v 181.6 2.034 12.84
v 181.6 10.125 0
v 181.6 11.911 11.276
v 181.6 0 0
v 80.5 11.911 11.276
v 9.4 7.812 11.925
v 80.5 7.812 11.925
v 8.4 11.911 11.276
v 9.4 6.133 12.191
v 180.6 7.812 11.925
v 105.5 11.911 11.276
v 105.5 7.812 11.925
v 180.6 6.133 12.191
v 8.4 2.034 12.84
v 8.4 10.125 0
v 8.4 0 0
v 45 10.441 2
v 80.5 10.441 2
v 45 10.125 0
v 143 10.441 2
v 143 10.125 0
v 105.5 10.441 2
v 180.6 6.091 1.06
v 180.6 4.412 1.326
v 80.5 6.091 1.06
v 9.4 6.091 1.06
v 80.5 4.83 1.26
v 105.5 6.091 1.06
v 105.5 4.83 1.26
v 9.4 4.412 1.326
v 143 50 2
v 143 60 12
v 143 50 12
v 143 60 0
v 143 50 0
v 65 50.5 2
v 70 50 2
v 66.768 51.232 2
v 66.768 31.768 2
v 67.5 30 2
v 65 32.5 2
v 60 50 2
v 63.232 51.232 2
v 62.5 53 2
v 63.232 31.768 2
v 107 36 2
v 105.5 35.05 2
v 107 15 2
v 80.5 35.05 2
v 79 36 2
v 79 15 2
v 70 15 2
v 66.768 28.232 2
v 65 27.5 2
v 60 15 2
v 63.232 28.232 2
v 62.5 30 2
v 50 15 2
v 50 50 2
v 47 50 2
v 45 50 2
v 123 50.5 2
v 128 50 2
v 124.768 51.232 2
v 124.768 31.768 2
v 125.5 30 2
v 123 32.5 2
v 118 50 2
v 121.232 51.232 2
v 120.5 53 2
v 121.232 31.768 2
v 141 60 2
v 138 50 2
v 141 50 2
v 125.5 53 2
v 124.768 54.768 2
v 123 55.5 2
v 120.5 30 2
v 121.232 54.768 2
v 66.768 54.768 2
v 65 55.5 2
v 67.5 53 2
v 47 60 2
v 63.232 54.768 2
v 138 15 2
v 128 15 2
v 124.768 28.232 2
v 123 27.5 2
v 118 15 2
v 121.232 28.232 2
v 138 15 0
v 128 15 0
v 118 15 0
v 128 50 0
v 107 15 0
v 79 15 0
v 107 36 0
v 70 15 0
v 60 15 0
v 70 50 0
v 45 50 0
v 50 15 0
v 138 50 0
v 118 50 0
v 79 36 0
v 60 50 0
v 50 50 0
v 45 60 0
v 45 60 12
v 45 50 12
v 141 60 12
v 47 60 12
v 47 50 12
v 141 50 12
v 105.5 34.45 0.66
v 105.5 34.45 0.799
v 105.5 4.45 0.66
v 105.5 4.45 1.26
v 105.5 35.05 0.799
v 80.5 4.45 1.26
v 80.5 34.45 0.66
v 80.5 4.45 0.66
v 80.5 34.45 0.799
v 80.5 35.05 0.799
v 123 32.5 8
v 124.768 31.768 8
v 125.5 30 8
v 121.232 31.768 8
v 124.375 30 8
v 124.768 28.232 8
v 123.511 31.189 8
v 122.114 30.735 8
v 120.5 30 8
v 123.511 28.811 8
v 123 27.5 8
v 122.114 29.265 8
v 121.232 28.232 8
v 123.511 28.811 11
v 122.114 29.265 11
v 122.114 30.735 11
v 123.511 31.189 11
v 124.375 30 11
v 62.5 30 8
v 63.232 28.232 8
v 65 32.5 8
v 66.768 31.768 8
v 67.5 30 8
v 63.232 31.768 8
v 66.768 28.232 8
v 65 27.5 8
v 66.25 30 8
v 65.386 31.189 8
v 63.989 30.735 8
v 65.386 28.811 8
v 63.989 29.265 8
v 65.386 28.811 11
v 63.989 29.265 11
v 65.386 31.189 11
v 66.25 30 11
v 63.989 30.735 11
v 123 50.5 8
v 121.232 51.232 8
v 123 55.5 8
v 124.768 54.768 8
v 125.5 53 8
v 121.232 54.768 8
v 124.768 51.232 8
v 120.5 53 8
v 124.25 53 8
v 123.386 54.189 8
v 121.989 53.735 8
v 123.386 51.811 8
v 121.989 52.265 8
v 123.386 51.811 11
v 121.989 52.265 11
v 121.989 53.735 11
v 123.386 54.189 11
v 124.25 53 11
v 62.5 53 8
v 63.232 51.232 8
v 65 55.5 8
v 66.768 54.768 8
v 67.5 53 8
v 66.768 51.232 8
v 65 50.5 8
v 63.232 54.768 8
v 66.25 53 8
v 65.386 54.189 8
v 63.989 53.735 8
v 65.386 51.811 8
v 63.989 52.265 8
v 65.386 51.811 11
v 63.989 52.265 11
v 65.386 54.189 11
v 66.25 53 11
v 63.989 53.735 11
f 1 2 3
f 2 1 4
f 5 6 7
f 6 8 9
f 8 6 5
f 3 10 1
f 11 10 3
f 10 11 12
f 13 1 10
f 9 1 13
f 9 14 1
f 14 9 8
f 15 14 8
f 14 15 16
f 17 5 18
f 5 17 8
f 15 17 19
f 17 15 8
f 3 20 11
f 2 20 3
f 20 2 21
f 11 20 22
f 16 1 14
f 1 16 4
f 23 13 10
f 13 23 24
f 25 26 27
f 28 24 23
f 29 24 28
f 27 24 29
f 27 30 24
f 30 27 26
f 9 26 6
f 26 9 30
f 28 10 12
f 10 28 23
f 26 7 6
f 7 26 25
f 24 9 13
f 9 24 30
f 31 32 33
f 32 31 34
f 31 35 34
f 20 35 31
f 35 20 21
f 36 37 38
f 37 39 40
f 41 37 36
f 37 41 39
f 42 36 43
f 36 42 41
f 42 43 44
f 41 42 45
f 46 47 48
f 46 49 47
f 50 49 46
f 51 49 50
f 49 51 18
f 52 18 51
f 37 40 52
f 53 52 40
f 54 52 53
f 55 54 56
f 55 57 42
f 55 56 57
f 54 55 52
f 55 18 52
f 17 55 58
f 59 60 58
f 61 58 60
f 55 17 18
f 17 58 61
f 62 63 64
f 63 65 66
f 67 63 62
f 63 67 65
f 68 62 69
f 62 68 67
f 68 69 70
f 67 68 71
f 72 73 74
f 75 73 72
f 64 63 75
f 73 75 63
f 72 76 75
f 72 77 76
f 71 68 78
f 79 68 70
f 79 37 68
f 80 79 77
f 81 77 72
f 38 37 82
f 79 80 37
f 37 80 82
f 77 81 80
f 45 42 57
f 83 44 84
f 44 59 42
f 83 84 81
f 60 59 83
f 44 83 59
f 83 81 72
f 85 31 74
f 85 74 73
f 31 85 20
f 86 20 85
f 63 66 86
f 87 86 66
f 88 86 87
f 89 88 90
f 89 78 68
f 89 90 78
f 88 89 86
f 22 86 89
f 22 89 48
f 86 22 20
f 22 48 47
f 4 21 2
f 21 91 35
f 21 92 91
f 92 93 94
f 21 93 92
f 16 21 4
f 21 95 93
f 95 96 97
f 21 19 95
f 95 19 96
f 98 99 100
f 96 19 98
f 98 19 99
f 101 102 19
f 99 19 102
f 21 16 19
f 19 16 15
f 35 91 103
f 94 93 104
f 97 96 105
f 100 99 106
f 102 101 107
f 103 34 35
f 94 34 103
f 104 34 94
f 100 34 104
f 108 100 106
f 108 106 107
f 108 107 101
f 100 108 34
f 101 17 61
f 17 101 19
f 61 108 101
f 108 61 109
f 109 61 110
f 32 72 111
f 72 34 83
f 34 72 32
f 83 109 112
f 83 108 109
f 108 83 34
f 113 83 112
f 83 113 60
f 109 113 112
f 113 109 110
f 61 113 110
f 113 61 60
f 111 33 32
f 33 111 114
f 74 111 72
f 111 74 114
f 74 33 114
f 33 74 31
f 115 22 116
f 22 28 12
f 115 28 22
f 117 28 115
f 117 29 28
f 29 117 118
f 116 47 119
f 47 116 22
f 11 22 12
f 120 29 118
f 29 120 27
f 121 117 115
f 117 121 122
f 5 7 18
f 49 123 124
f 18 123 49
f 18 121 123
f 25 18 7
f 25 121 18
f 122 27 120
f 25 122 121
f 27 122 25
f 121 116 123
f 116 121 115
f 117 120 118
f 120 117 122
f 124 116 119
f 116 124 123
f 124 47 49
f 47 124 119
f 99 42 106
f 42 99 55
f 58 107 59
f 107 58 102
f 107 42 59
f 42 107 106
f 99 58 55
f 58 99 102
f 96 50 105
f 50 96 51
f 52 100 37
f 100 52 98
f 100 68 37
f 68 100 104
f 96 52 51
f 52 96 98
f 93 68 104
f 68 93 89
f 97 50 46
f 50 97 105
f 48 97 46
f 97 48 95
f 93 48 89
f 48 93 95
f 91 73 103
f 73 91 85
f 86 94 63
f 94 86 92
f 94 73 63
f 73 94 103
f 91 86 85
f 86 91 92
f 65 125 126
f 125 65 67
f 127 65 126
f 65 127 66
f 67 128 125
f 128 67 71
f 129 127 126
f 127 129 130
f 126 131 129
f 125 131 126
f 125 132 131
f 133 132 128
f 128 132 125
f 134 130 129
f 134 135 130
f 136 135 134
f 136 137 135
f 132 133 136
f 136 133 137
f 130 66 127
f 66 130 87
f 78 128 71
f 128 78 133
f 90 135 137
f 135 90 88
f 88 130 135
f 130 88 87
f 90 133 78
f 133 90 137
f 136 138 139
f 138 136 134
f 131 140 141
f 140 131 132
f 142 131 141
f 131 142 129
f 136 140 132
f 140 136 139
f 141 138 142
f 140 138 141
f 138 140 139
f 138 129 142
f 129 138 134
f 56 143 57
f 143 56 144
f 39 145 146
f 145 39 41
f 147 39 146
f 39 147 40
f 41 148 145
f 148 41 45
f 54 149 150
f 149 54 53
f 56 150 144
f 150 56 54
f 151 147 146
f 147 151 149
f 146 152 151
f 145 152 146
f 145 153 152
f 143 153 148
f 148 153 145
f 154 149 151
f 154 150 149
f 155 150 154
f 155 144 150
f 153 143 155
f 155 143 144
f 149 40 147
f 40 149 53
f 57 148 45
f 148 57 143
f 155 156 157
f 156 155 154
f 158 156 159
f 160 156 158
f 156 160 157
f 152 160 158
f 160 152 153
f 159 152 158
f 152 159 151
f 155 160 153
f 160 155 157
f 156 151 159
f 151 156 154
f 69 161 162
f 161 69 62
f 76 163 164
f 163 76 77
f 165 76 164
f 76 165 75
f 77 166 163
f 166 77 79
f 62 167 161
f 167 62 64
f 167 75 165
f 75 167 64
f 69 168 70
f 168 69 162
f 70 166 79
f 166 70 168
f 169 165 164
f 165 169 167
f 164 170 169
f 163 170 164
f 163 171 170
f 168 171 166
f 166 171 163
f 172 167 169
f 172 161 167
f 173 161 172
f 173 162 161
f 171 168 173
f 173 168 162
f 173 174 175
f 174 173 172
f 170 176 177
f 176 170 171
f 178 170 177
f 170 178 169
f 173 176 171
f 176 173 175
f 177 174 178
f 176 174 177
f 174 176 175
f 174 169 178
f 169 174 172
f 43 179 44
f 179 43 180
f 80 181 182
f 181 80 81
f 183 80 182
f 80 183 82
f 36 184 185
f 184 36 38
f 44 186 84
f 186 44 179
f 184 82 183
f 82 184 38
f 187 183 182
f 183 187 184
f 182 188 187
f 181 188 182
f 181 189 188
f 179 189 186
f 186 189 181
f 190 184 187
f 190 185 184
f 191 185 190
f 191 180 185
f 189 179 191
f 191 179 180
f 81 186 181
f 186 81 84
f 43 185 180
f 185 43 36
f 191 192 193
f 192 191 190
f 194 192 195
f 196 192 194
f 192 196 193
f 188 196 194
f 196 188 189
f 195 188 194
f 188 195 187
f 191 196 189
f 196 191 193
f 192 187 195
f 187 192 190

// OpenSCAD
//
// ktEPD2
//

gap1 = 0.001;
gap2 = 0.002;
th = 2;


body_x = 170.2+1.0;
body_y = 111.5;
body_z = 1.2+0.5;
body_d = 2.7;

waku_x = 190;
waku_y = 10;
waku_z = 11;

bwaku_x = 80+10;
bwaku_y = 50;
poll1 = 6;
poll2 = 9;

stand_z = 50;
side_z = 10;

A = 1;


if(A)
{
    difference()
    {
        union()
        {
            rotate( [-9, 0, 0] )
            difference()
            {
                translate( [(waku_x-(body_x+2))/2, 0, 0] )
                cube( [body_x+2, waku_y, th+waku_z] );
                
                translate( [(waku_x-body_x)/2, waku_y/2-body_z/2, th] )
                cube( [body_x, body_z, body_y] );
            }
            translate( [waku_x/2-bwaku_x/2-5, 10, 0] )
            cube( [bwaku_x+8, bwaku_y, th] );
            translate( [waku_x/2-bwaku_x/2-5, 50, th] )
            cube( [th, 10, 10] );
            translate( [waku_x/2+bwaku_x/2+3-th, 50, th] )
            cube( [th, 10, 10] );
        }

        translate( [waku_x/2-25/2-2, waku_y/2-body_z/2+0.3, 0.66] )
        cube( [25, 30, 0.6] );
        translate( [waku_x/2-25/2-2, waku_y/2-body_z/2+0.9, 0.8-gap1] )
        cube( [25, 30, 3+gap2] );
        translate( [waku_x/2-25/2-2, waku_y/2-body_z/2+1.8, 3.8-gap1] )
        cube( [25, 10, 5+gap2] );
        translate( [waku_x/2-25/2-2, waku_y/2-body_z/2+2.5, 8.8] )
        cube( [25, 10, 5] );
        translate( [-gap1, 0, -10] )
        cube( [waku_x+gap2, 50, 10] );
        
        translate( [50, 15, -10] )
        cube( [10, 35, 50] );
        translate( [70, 15, -10] )
        cube( [9, 35, 50] );
        translate( [78, 36, -10] )
        cube( [40, 14, 50] );
        translate( [107, 15, -10] )
        cube( [11, 35, 50] );
        translate( [128, 15, -10] )
        cube( [10, 35, 50] );
    }
    
    translate( [waku_x-bwaku_x-6, 30, th] )
    {
        translate( [58/2, 0, poll1/2] )
        cylinder( h=poll1, r=5/2, center=true );
        translate( [58.25/2, 0, poll2/2] )
        cylinder( h=poll2, r=2.5/2, center=true );
        translate( [-58/2, 0, poll1/2] )
        cylinder( h=poll1, r=5/2, center=true );
        translate( [-58/2, 0, poll2/2] )
        cylinder( h=poll2, r=2.5/2, center=true );
        translate( [58/2, 23, poll1/2] )
        cylinder( h=poll1, r=5/2, center=true );
        translate( [58/2, 23, poll2/2] )
        cylinder( h=poll2, r=2.5/2, center=true );
        translate( [-58/2, 23, poll1/2] )
        cylinder( h=poll1, r=5/2, center=true );
        translate( [-58/2, 23, poll2/2] )
        cylinder( h=poll2, r=2.5/2, center=true );
    }
}
